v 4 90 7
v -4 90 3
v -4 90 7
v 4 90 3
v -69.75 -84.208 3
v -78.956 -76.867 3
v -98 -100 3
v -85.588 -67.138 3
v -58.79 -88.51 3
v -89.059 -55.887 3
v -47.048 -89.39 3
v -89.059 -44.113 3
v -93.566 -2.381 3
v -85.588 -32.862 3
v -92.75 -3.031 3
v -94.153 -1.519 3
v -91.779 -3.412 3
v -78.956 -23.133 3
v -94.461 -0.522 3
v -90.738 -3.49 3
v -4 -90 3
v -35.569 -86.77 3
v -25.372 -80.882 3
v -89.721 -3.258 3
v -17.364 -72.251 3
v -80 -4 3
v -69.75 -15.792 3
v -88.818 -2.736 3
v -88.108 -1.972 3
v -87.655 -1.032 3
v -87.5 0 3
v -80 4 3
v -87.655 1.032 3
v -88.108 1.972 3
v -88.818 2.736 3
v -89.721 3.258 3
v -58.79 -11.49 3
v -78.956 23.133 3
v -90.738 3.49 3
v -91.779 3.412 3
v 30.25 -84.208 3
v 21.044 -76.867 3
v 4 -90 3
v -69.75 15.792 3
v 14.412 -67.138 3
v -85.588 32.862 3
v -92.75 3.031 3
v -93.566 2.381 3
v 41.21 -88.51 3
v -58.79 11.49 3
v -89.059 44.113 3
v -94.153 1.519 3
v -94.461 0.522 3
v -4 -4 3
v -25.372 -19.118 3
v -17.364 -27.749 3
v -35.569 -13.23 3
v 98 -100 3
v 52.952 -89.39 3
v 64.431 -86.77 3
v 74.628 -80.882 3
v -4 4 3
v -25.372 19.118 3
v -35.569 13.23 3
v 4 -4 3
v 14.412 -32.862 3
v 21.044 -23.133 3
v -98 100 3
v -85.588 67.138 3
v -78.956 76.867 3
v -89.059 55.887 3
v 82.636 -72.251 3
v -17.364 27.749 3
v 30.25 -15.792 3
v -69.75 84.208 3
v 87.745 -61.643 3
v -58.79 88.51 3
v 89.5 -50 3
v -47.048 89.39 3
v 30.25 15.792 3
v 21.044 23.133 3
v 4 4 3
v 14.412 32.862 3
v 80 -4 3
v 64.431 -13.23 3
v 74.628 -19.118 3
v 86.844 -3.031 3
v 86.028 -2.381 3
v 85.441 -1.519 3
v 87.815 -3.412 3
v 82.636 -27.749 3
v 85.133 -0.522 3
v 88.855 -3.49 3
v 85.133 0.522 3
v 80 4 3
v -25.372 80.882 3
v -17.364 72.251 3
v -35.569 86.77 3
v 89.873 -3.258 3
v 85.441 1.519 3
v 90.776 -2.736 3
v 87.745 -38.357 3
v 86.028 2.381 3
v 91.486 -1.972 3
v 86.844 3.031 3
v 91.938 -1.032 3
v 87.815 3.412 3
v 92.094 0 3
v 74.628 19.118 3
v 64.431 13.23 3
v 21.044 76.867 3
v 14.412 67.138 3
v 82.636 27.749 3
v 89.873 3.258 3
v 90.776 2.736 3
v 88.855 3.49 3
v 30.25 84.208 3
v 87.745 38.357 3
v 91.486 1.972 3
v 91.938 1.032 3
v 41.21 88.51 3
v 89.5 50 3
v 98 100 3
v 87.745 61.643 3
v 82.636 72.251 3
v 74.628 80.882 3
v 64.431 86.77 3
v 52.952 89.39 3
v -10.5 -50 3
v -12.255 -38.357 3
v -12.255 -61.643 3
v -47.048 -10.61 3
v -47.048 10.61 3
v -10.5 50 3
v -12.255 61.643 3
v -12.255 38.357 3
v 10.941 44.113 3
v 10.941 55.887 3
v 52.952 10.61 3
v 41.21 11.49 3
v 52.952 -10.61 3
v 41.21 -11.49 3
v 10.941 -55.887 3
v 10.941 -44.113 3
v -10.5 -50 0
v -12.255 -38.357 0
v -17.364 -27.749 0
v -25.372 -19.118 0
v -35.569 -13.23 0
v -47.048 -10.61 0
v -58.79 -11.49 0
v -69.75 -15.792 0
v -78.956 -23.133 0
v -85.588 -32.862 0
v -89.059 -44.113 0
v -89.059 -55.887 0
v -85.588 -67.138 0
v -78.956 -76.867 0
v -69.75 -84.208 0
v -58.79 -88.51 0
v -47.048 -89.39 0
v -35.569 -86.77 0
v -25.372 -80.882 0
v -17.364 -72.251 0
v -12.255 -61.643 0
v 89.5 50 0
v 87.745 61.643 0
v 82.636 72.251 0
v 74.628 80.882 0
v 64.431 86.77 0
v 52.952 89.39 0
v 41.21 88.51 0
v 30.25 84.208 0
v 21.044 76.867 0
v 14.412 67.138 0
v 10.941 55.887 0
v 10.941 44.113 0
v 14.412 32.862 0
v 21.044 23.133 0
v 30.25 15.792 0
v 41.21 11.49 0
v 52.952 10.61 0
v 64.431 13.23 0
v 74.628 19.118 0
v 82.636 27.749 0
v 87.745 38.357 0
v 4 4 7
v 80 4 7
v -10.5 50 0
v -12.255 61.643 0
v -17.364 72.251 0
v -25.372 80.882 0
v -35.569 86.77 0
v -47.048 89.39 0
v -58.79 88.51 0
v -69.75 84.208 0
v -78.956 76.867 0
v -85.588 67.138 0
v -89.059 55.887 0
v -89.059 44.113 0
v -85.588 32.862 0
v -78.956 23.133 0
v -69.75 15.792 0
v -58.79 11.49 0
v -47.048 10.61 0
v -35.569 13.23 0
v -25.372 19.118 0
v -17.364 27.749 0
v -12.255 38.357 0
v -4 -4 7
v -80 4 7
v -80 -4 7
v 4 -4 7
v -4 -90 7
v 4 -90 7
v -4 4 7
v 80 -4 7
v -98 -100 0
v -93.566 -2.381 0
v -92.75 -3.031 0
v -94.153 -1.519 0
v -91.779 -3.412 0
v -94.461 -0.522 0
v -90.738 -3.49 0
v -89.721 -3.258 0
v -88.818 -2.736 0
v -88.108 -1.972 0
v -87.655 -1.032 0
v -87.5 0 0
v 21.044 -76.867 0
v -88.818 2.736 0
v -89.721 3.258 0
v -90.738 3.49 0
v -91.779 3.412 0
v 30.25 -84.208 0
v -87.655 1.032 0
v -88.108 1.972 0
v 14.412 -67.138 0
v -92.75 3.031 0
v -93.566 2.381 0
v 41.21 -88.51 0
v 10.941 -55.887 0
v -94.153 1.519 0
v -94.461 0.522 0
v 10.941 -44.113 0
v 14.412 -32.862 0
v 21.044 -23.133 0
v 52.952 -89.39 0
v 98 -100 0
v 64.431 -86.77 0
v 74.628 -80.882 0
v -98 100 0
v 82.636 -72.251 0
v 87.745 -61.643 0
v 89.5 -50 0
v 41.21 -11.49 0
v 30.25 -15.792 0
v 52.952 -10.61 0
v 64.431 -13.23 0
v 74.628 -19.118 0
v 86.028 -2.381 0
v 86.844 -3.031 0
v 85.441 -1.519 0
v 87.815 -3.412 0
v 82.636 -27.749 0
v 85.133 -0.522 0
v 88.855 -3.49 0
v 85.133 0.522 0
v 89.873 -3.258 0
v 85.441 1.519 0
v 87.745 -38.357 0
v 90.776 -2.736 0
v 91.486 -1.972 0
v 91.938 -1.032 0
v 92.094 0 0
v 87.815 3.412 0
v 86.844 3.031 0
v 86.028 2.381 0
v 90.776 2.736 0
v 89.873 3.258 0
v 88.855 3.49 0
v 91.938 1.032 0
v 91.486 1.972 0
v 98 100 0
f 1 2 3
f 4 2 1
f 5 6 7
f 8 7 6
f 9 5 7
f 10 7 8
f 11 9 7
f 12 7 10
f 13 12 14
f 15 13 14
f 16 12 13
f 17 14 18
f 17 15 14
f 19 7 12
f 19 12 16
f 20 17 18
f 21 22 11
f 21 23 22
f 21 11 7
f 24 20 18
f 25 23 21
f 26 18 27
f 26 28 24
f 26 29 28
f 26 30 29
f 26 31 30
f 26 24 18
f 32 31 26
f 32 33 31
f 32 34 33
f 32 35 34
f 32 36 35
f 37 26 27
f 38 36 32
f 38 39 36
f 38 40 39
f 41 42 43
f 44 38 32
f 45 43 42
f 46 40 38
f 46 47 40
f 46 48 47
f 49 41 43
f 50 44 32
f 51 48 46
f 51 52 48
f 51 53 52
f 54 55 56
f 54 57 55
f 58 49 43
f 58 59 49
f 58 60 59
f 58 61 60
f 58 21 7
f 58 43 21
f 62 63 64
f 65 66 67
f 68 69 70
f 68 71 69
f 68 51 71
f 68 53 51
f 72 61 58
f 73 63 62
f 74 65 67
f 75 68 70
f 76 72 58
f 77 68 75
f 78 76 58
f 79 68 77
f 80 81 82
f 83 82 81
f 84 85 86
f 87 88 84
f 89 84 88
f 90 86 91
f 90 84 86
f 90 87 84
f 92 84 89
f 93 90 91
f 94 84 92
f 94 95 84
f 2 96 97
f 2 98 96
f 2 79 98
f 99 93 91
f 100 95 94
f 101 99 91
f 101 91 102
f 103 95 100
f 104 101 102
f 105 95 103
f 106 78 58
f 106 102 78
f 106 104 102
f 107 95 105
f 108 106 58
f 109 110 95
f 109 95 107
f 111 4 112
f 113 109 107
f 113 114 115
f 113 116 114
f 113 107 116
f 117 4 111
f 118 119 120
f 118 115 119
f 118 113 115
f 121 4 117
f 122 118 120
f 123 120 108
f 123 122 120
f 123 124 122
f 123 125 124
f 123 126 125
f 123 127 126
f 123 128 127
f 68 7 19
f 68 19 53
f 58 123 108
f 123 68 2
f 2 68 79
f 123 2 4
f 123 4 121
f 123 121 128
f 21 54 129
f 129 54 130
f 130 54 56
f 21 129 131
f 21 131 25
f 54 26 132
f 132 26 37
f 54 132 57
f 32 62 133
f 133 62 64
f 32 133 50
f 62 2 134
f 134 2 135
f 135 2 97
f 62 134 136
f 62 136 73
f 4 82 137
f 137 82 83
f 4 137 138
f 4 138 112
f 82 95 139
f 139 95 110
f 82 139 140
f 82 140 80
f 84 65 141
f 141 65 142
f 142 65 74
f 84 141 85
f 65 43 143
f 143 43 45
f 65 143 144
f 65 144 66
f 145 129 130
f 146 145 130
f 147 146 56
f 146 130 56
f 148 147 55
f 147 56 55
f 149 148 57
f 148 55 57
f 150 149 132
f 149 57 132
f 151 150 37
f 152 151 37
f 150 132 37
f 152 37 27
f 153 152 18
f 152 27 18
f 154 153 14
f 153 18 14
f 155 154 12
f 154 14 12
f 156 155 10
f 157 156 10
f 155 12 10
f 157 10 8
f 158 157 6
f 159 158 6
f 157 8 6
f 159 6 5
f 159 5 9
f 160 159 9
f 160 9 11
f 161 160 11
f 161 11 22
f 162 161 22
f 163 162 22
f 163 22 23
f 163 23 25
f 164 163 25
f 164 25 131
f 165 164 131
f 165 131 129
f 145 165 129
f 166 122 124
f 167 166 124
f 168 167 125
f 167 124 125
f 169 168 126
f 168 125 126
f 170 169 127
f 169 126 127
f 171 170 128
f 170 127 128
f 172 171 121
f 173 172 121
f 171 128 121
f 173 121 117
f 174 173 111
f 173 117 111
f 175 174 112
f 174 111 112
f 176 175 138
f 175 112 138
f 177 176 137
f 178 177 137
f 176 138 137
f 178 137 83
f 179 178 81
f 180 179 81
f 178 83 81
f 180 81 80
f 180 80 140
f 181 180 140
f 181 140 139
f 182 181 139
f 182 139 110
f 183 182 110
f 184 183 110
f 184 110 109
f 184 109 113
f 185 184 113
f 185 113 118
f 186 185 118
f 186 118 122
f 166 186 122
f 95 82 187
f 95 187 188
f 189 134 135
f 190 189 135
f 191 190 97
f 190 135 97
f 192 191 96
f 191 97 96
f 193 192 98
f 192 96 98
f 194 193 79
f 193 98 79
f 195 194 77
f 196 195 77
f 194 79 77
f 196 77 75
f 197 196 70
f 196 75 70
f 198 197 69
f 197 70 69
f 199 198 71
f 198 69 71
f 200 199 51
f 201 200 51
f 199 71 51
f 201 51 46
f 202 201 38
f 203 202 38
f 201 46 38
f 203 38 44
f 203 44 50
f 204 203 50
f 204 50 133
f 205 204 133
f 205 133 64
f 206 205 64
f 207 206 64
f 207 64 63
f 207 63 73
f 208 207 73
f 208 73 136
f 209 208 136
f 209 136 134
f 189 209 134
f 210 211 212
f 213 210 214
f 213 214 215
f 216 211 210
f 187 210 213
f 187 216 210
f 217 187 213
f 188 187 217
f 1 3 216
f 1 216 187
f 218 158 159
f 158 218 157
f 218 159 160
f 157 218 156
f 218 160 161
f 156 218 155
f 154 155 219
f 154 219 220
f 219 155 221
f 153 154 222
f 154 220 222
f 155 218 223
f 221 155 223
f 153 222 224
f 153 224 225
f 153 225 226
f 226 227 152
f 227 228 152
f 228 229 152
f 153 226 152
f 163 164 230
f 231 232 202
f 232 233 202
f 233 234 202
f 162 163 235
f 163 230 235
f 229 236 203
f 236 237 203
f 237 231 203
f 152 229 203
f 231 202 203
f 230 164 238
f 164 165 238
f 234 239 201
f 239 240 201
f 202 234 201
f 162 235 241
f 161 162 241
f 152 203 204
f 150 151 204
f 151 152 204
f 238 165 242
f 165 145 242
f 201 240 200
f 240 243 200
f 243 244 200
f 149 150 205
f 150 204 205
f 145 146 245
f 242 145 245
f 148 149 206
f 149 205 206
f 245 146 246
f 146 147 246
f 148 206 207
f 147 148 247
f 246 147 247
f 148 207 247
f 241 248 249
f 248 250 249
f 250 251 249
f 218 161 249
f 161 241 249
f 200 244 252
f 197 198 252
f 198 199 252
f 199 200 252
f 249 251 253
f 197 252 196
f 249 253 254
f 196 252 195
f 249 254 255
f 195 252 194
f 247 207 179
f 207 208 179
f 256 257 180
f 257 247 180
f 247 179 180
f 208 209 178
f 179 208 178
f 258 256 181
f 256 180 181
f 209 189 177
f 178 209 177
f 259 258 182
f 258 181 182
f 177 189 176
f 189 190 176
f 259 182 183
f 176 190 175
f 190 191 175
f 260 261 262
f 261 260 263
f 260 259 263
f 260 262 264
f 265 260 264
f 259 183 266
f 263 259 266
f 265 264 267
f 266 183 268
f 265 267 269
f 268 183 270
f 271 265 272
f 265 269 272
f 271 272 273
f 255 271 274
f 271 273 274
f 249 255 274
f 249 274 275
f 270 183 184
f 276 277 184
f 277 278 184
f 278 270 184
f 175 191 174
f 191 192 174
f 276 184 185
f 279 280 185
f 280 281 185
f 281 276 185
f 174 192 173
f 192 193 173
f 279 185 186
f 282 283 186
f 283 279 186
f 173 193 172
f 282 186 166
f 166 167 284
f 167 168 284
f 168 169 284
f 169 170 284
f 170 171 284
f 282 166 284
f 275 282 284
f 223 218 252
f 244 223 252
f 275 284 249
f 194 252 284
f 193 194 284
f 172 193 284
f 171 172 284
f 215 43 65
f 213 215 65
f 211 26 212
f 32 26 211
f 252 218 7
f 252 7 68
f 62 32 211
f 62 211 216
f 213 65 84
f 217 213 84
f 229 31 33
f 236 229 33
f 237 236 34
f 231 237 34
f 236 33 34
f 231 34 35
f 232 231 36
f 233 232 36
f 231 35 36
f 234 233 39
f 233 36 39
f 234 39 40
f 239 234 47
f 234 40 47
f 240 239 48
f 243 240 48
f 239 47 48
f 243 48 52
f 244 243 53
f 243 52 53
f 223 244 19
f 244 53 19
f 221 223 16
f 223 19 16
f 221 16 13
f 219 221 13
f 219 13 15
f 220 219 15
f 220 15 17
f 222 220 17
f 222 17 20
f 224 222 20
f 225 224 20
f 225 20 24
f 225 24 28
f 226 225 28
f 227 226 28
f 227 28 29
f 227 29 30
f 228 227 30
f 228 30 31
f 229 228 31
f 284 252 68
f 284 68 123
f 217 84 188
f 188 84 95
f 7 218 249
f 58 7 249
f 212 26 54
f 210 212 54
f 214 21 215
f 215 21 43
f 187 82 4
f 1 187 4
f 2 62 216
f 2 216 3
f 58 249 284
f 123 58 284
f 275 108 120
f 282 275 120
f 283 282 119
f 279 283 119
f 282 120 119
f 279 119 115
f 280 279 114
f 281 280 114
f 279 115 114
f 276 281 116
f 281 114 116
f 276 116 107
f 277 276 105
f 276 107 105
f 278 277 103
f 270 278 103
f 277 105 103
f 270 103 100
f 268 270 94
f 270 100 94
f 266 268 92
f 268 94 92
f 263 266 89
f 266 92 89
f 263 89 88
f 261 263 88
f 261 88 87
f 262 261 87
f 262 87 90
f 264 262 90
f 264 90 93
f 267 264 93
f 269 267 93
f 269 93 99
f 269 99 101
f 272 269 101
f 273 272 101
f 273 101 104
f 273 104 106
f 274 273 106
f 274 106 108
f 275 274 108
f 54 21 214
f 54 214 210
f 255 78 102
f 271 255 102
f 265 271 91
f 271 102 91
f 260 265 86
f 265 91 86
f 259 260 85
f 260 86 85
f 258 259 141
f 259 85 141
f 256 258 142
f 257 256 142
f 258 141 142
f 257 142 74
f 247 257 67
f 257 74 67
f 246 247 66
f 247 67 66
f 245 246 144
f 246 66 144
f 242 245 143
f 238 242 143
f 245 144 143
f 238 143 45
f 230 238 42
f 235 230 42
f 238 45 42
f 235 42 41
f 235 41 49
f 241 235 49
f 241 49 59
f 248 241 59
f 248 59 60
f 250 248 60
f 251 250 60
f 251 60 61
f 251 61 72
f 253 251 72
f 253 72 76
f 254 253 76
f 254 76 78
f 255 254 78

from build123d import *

# Parameters (mm, degrees)
SKETCH_W        = 196
SKETCH_H        = 200
PAD_DEPTH       = 3
SKETCH001_R     = 39.5
POCKET_DEPTH    = 5
SKETCH002_R     = 3.5
POCKET001_DEPTH = 5
SKETCH003_W     = 8
SKETCH003_H     = 180
PAD001_DEPTH    = 4
SKETCH004_W     = 160
SKETCH004_H     = 8
PAD002_DEPTH    = 4


with BuildPart() as part:
    # Sketch → Pad (new body)
    with BuildSketch(Plane.XY):
        Rectangle(SKETCH_W, SKETCH_H)
    extrude(amount=PAD_DEPTH)

    # Sketch001 (on Face6 of Pad) → Pocket (cut)
    with BuildSketch(Plane.XY.offset(3)):
        with Locations((-50, 50)):
            Circle(SKETCH001_R)
        with Locations((50, 50)):
            Circle(SKETCH001_R)
        with Locations((50, -50)):
            Circle(SKETCH001_R)
        with Locations((-50, -50)):
            Circle(SKETCH001_R)
    extrude(amount=-POCKET_DEPTH, mode=Mode.SUBTRACT)

    # Sketch002 (on Face5 of Pocket) → Pocket001 (cut)
    with BuildSketch(Plane.XY.offset(3)):
        with Locations((-91, 0)):
            Circle(SKETCH002_R)
        with Locations((88.593941, 0)):
            Circle(SKETCH002_R)
    extrude(amount=-POCKET001_DEPTH, mode=Mode.SUBTRACT)

    # Sketch003 (on Face5 of Pocket001) → Pad001 (join)
    with BuildSketch(Plane.XY.offset(3)):
        Rectangle(SKETCH003_W, SKETCH003_H)
    extrude(amount=PAD001_DEPTH)

    # Sketch004 (on Face5 of Pad001) → Pad002 (join)
    with BuildSketch(Plane.XY.offset(3)):
        Rectangle(SKETCH004_W, SKETCH004_H)
    extrude(amount=PAD002_DEPTH)


solid = part.part
